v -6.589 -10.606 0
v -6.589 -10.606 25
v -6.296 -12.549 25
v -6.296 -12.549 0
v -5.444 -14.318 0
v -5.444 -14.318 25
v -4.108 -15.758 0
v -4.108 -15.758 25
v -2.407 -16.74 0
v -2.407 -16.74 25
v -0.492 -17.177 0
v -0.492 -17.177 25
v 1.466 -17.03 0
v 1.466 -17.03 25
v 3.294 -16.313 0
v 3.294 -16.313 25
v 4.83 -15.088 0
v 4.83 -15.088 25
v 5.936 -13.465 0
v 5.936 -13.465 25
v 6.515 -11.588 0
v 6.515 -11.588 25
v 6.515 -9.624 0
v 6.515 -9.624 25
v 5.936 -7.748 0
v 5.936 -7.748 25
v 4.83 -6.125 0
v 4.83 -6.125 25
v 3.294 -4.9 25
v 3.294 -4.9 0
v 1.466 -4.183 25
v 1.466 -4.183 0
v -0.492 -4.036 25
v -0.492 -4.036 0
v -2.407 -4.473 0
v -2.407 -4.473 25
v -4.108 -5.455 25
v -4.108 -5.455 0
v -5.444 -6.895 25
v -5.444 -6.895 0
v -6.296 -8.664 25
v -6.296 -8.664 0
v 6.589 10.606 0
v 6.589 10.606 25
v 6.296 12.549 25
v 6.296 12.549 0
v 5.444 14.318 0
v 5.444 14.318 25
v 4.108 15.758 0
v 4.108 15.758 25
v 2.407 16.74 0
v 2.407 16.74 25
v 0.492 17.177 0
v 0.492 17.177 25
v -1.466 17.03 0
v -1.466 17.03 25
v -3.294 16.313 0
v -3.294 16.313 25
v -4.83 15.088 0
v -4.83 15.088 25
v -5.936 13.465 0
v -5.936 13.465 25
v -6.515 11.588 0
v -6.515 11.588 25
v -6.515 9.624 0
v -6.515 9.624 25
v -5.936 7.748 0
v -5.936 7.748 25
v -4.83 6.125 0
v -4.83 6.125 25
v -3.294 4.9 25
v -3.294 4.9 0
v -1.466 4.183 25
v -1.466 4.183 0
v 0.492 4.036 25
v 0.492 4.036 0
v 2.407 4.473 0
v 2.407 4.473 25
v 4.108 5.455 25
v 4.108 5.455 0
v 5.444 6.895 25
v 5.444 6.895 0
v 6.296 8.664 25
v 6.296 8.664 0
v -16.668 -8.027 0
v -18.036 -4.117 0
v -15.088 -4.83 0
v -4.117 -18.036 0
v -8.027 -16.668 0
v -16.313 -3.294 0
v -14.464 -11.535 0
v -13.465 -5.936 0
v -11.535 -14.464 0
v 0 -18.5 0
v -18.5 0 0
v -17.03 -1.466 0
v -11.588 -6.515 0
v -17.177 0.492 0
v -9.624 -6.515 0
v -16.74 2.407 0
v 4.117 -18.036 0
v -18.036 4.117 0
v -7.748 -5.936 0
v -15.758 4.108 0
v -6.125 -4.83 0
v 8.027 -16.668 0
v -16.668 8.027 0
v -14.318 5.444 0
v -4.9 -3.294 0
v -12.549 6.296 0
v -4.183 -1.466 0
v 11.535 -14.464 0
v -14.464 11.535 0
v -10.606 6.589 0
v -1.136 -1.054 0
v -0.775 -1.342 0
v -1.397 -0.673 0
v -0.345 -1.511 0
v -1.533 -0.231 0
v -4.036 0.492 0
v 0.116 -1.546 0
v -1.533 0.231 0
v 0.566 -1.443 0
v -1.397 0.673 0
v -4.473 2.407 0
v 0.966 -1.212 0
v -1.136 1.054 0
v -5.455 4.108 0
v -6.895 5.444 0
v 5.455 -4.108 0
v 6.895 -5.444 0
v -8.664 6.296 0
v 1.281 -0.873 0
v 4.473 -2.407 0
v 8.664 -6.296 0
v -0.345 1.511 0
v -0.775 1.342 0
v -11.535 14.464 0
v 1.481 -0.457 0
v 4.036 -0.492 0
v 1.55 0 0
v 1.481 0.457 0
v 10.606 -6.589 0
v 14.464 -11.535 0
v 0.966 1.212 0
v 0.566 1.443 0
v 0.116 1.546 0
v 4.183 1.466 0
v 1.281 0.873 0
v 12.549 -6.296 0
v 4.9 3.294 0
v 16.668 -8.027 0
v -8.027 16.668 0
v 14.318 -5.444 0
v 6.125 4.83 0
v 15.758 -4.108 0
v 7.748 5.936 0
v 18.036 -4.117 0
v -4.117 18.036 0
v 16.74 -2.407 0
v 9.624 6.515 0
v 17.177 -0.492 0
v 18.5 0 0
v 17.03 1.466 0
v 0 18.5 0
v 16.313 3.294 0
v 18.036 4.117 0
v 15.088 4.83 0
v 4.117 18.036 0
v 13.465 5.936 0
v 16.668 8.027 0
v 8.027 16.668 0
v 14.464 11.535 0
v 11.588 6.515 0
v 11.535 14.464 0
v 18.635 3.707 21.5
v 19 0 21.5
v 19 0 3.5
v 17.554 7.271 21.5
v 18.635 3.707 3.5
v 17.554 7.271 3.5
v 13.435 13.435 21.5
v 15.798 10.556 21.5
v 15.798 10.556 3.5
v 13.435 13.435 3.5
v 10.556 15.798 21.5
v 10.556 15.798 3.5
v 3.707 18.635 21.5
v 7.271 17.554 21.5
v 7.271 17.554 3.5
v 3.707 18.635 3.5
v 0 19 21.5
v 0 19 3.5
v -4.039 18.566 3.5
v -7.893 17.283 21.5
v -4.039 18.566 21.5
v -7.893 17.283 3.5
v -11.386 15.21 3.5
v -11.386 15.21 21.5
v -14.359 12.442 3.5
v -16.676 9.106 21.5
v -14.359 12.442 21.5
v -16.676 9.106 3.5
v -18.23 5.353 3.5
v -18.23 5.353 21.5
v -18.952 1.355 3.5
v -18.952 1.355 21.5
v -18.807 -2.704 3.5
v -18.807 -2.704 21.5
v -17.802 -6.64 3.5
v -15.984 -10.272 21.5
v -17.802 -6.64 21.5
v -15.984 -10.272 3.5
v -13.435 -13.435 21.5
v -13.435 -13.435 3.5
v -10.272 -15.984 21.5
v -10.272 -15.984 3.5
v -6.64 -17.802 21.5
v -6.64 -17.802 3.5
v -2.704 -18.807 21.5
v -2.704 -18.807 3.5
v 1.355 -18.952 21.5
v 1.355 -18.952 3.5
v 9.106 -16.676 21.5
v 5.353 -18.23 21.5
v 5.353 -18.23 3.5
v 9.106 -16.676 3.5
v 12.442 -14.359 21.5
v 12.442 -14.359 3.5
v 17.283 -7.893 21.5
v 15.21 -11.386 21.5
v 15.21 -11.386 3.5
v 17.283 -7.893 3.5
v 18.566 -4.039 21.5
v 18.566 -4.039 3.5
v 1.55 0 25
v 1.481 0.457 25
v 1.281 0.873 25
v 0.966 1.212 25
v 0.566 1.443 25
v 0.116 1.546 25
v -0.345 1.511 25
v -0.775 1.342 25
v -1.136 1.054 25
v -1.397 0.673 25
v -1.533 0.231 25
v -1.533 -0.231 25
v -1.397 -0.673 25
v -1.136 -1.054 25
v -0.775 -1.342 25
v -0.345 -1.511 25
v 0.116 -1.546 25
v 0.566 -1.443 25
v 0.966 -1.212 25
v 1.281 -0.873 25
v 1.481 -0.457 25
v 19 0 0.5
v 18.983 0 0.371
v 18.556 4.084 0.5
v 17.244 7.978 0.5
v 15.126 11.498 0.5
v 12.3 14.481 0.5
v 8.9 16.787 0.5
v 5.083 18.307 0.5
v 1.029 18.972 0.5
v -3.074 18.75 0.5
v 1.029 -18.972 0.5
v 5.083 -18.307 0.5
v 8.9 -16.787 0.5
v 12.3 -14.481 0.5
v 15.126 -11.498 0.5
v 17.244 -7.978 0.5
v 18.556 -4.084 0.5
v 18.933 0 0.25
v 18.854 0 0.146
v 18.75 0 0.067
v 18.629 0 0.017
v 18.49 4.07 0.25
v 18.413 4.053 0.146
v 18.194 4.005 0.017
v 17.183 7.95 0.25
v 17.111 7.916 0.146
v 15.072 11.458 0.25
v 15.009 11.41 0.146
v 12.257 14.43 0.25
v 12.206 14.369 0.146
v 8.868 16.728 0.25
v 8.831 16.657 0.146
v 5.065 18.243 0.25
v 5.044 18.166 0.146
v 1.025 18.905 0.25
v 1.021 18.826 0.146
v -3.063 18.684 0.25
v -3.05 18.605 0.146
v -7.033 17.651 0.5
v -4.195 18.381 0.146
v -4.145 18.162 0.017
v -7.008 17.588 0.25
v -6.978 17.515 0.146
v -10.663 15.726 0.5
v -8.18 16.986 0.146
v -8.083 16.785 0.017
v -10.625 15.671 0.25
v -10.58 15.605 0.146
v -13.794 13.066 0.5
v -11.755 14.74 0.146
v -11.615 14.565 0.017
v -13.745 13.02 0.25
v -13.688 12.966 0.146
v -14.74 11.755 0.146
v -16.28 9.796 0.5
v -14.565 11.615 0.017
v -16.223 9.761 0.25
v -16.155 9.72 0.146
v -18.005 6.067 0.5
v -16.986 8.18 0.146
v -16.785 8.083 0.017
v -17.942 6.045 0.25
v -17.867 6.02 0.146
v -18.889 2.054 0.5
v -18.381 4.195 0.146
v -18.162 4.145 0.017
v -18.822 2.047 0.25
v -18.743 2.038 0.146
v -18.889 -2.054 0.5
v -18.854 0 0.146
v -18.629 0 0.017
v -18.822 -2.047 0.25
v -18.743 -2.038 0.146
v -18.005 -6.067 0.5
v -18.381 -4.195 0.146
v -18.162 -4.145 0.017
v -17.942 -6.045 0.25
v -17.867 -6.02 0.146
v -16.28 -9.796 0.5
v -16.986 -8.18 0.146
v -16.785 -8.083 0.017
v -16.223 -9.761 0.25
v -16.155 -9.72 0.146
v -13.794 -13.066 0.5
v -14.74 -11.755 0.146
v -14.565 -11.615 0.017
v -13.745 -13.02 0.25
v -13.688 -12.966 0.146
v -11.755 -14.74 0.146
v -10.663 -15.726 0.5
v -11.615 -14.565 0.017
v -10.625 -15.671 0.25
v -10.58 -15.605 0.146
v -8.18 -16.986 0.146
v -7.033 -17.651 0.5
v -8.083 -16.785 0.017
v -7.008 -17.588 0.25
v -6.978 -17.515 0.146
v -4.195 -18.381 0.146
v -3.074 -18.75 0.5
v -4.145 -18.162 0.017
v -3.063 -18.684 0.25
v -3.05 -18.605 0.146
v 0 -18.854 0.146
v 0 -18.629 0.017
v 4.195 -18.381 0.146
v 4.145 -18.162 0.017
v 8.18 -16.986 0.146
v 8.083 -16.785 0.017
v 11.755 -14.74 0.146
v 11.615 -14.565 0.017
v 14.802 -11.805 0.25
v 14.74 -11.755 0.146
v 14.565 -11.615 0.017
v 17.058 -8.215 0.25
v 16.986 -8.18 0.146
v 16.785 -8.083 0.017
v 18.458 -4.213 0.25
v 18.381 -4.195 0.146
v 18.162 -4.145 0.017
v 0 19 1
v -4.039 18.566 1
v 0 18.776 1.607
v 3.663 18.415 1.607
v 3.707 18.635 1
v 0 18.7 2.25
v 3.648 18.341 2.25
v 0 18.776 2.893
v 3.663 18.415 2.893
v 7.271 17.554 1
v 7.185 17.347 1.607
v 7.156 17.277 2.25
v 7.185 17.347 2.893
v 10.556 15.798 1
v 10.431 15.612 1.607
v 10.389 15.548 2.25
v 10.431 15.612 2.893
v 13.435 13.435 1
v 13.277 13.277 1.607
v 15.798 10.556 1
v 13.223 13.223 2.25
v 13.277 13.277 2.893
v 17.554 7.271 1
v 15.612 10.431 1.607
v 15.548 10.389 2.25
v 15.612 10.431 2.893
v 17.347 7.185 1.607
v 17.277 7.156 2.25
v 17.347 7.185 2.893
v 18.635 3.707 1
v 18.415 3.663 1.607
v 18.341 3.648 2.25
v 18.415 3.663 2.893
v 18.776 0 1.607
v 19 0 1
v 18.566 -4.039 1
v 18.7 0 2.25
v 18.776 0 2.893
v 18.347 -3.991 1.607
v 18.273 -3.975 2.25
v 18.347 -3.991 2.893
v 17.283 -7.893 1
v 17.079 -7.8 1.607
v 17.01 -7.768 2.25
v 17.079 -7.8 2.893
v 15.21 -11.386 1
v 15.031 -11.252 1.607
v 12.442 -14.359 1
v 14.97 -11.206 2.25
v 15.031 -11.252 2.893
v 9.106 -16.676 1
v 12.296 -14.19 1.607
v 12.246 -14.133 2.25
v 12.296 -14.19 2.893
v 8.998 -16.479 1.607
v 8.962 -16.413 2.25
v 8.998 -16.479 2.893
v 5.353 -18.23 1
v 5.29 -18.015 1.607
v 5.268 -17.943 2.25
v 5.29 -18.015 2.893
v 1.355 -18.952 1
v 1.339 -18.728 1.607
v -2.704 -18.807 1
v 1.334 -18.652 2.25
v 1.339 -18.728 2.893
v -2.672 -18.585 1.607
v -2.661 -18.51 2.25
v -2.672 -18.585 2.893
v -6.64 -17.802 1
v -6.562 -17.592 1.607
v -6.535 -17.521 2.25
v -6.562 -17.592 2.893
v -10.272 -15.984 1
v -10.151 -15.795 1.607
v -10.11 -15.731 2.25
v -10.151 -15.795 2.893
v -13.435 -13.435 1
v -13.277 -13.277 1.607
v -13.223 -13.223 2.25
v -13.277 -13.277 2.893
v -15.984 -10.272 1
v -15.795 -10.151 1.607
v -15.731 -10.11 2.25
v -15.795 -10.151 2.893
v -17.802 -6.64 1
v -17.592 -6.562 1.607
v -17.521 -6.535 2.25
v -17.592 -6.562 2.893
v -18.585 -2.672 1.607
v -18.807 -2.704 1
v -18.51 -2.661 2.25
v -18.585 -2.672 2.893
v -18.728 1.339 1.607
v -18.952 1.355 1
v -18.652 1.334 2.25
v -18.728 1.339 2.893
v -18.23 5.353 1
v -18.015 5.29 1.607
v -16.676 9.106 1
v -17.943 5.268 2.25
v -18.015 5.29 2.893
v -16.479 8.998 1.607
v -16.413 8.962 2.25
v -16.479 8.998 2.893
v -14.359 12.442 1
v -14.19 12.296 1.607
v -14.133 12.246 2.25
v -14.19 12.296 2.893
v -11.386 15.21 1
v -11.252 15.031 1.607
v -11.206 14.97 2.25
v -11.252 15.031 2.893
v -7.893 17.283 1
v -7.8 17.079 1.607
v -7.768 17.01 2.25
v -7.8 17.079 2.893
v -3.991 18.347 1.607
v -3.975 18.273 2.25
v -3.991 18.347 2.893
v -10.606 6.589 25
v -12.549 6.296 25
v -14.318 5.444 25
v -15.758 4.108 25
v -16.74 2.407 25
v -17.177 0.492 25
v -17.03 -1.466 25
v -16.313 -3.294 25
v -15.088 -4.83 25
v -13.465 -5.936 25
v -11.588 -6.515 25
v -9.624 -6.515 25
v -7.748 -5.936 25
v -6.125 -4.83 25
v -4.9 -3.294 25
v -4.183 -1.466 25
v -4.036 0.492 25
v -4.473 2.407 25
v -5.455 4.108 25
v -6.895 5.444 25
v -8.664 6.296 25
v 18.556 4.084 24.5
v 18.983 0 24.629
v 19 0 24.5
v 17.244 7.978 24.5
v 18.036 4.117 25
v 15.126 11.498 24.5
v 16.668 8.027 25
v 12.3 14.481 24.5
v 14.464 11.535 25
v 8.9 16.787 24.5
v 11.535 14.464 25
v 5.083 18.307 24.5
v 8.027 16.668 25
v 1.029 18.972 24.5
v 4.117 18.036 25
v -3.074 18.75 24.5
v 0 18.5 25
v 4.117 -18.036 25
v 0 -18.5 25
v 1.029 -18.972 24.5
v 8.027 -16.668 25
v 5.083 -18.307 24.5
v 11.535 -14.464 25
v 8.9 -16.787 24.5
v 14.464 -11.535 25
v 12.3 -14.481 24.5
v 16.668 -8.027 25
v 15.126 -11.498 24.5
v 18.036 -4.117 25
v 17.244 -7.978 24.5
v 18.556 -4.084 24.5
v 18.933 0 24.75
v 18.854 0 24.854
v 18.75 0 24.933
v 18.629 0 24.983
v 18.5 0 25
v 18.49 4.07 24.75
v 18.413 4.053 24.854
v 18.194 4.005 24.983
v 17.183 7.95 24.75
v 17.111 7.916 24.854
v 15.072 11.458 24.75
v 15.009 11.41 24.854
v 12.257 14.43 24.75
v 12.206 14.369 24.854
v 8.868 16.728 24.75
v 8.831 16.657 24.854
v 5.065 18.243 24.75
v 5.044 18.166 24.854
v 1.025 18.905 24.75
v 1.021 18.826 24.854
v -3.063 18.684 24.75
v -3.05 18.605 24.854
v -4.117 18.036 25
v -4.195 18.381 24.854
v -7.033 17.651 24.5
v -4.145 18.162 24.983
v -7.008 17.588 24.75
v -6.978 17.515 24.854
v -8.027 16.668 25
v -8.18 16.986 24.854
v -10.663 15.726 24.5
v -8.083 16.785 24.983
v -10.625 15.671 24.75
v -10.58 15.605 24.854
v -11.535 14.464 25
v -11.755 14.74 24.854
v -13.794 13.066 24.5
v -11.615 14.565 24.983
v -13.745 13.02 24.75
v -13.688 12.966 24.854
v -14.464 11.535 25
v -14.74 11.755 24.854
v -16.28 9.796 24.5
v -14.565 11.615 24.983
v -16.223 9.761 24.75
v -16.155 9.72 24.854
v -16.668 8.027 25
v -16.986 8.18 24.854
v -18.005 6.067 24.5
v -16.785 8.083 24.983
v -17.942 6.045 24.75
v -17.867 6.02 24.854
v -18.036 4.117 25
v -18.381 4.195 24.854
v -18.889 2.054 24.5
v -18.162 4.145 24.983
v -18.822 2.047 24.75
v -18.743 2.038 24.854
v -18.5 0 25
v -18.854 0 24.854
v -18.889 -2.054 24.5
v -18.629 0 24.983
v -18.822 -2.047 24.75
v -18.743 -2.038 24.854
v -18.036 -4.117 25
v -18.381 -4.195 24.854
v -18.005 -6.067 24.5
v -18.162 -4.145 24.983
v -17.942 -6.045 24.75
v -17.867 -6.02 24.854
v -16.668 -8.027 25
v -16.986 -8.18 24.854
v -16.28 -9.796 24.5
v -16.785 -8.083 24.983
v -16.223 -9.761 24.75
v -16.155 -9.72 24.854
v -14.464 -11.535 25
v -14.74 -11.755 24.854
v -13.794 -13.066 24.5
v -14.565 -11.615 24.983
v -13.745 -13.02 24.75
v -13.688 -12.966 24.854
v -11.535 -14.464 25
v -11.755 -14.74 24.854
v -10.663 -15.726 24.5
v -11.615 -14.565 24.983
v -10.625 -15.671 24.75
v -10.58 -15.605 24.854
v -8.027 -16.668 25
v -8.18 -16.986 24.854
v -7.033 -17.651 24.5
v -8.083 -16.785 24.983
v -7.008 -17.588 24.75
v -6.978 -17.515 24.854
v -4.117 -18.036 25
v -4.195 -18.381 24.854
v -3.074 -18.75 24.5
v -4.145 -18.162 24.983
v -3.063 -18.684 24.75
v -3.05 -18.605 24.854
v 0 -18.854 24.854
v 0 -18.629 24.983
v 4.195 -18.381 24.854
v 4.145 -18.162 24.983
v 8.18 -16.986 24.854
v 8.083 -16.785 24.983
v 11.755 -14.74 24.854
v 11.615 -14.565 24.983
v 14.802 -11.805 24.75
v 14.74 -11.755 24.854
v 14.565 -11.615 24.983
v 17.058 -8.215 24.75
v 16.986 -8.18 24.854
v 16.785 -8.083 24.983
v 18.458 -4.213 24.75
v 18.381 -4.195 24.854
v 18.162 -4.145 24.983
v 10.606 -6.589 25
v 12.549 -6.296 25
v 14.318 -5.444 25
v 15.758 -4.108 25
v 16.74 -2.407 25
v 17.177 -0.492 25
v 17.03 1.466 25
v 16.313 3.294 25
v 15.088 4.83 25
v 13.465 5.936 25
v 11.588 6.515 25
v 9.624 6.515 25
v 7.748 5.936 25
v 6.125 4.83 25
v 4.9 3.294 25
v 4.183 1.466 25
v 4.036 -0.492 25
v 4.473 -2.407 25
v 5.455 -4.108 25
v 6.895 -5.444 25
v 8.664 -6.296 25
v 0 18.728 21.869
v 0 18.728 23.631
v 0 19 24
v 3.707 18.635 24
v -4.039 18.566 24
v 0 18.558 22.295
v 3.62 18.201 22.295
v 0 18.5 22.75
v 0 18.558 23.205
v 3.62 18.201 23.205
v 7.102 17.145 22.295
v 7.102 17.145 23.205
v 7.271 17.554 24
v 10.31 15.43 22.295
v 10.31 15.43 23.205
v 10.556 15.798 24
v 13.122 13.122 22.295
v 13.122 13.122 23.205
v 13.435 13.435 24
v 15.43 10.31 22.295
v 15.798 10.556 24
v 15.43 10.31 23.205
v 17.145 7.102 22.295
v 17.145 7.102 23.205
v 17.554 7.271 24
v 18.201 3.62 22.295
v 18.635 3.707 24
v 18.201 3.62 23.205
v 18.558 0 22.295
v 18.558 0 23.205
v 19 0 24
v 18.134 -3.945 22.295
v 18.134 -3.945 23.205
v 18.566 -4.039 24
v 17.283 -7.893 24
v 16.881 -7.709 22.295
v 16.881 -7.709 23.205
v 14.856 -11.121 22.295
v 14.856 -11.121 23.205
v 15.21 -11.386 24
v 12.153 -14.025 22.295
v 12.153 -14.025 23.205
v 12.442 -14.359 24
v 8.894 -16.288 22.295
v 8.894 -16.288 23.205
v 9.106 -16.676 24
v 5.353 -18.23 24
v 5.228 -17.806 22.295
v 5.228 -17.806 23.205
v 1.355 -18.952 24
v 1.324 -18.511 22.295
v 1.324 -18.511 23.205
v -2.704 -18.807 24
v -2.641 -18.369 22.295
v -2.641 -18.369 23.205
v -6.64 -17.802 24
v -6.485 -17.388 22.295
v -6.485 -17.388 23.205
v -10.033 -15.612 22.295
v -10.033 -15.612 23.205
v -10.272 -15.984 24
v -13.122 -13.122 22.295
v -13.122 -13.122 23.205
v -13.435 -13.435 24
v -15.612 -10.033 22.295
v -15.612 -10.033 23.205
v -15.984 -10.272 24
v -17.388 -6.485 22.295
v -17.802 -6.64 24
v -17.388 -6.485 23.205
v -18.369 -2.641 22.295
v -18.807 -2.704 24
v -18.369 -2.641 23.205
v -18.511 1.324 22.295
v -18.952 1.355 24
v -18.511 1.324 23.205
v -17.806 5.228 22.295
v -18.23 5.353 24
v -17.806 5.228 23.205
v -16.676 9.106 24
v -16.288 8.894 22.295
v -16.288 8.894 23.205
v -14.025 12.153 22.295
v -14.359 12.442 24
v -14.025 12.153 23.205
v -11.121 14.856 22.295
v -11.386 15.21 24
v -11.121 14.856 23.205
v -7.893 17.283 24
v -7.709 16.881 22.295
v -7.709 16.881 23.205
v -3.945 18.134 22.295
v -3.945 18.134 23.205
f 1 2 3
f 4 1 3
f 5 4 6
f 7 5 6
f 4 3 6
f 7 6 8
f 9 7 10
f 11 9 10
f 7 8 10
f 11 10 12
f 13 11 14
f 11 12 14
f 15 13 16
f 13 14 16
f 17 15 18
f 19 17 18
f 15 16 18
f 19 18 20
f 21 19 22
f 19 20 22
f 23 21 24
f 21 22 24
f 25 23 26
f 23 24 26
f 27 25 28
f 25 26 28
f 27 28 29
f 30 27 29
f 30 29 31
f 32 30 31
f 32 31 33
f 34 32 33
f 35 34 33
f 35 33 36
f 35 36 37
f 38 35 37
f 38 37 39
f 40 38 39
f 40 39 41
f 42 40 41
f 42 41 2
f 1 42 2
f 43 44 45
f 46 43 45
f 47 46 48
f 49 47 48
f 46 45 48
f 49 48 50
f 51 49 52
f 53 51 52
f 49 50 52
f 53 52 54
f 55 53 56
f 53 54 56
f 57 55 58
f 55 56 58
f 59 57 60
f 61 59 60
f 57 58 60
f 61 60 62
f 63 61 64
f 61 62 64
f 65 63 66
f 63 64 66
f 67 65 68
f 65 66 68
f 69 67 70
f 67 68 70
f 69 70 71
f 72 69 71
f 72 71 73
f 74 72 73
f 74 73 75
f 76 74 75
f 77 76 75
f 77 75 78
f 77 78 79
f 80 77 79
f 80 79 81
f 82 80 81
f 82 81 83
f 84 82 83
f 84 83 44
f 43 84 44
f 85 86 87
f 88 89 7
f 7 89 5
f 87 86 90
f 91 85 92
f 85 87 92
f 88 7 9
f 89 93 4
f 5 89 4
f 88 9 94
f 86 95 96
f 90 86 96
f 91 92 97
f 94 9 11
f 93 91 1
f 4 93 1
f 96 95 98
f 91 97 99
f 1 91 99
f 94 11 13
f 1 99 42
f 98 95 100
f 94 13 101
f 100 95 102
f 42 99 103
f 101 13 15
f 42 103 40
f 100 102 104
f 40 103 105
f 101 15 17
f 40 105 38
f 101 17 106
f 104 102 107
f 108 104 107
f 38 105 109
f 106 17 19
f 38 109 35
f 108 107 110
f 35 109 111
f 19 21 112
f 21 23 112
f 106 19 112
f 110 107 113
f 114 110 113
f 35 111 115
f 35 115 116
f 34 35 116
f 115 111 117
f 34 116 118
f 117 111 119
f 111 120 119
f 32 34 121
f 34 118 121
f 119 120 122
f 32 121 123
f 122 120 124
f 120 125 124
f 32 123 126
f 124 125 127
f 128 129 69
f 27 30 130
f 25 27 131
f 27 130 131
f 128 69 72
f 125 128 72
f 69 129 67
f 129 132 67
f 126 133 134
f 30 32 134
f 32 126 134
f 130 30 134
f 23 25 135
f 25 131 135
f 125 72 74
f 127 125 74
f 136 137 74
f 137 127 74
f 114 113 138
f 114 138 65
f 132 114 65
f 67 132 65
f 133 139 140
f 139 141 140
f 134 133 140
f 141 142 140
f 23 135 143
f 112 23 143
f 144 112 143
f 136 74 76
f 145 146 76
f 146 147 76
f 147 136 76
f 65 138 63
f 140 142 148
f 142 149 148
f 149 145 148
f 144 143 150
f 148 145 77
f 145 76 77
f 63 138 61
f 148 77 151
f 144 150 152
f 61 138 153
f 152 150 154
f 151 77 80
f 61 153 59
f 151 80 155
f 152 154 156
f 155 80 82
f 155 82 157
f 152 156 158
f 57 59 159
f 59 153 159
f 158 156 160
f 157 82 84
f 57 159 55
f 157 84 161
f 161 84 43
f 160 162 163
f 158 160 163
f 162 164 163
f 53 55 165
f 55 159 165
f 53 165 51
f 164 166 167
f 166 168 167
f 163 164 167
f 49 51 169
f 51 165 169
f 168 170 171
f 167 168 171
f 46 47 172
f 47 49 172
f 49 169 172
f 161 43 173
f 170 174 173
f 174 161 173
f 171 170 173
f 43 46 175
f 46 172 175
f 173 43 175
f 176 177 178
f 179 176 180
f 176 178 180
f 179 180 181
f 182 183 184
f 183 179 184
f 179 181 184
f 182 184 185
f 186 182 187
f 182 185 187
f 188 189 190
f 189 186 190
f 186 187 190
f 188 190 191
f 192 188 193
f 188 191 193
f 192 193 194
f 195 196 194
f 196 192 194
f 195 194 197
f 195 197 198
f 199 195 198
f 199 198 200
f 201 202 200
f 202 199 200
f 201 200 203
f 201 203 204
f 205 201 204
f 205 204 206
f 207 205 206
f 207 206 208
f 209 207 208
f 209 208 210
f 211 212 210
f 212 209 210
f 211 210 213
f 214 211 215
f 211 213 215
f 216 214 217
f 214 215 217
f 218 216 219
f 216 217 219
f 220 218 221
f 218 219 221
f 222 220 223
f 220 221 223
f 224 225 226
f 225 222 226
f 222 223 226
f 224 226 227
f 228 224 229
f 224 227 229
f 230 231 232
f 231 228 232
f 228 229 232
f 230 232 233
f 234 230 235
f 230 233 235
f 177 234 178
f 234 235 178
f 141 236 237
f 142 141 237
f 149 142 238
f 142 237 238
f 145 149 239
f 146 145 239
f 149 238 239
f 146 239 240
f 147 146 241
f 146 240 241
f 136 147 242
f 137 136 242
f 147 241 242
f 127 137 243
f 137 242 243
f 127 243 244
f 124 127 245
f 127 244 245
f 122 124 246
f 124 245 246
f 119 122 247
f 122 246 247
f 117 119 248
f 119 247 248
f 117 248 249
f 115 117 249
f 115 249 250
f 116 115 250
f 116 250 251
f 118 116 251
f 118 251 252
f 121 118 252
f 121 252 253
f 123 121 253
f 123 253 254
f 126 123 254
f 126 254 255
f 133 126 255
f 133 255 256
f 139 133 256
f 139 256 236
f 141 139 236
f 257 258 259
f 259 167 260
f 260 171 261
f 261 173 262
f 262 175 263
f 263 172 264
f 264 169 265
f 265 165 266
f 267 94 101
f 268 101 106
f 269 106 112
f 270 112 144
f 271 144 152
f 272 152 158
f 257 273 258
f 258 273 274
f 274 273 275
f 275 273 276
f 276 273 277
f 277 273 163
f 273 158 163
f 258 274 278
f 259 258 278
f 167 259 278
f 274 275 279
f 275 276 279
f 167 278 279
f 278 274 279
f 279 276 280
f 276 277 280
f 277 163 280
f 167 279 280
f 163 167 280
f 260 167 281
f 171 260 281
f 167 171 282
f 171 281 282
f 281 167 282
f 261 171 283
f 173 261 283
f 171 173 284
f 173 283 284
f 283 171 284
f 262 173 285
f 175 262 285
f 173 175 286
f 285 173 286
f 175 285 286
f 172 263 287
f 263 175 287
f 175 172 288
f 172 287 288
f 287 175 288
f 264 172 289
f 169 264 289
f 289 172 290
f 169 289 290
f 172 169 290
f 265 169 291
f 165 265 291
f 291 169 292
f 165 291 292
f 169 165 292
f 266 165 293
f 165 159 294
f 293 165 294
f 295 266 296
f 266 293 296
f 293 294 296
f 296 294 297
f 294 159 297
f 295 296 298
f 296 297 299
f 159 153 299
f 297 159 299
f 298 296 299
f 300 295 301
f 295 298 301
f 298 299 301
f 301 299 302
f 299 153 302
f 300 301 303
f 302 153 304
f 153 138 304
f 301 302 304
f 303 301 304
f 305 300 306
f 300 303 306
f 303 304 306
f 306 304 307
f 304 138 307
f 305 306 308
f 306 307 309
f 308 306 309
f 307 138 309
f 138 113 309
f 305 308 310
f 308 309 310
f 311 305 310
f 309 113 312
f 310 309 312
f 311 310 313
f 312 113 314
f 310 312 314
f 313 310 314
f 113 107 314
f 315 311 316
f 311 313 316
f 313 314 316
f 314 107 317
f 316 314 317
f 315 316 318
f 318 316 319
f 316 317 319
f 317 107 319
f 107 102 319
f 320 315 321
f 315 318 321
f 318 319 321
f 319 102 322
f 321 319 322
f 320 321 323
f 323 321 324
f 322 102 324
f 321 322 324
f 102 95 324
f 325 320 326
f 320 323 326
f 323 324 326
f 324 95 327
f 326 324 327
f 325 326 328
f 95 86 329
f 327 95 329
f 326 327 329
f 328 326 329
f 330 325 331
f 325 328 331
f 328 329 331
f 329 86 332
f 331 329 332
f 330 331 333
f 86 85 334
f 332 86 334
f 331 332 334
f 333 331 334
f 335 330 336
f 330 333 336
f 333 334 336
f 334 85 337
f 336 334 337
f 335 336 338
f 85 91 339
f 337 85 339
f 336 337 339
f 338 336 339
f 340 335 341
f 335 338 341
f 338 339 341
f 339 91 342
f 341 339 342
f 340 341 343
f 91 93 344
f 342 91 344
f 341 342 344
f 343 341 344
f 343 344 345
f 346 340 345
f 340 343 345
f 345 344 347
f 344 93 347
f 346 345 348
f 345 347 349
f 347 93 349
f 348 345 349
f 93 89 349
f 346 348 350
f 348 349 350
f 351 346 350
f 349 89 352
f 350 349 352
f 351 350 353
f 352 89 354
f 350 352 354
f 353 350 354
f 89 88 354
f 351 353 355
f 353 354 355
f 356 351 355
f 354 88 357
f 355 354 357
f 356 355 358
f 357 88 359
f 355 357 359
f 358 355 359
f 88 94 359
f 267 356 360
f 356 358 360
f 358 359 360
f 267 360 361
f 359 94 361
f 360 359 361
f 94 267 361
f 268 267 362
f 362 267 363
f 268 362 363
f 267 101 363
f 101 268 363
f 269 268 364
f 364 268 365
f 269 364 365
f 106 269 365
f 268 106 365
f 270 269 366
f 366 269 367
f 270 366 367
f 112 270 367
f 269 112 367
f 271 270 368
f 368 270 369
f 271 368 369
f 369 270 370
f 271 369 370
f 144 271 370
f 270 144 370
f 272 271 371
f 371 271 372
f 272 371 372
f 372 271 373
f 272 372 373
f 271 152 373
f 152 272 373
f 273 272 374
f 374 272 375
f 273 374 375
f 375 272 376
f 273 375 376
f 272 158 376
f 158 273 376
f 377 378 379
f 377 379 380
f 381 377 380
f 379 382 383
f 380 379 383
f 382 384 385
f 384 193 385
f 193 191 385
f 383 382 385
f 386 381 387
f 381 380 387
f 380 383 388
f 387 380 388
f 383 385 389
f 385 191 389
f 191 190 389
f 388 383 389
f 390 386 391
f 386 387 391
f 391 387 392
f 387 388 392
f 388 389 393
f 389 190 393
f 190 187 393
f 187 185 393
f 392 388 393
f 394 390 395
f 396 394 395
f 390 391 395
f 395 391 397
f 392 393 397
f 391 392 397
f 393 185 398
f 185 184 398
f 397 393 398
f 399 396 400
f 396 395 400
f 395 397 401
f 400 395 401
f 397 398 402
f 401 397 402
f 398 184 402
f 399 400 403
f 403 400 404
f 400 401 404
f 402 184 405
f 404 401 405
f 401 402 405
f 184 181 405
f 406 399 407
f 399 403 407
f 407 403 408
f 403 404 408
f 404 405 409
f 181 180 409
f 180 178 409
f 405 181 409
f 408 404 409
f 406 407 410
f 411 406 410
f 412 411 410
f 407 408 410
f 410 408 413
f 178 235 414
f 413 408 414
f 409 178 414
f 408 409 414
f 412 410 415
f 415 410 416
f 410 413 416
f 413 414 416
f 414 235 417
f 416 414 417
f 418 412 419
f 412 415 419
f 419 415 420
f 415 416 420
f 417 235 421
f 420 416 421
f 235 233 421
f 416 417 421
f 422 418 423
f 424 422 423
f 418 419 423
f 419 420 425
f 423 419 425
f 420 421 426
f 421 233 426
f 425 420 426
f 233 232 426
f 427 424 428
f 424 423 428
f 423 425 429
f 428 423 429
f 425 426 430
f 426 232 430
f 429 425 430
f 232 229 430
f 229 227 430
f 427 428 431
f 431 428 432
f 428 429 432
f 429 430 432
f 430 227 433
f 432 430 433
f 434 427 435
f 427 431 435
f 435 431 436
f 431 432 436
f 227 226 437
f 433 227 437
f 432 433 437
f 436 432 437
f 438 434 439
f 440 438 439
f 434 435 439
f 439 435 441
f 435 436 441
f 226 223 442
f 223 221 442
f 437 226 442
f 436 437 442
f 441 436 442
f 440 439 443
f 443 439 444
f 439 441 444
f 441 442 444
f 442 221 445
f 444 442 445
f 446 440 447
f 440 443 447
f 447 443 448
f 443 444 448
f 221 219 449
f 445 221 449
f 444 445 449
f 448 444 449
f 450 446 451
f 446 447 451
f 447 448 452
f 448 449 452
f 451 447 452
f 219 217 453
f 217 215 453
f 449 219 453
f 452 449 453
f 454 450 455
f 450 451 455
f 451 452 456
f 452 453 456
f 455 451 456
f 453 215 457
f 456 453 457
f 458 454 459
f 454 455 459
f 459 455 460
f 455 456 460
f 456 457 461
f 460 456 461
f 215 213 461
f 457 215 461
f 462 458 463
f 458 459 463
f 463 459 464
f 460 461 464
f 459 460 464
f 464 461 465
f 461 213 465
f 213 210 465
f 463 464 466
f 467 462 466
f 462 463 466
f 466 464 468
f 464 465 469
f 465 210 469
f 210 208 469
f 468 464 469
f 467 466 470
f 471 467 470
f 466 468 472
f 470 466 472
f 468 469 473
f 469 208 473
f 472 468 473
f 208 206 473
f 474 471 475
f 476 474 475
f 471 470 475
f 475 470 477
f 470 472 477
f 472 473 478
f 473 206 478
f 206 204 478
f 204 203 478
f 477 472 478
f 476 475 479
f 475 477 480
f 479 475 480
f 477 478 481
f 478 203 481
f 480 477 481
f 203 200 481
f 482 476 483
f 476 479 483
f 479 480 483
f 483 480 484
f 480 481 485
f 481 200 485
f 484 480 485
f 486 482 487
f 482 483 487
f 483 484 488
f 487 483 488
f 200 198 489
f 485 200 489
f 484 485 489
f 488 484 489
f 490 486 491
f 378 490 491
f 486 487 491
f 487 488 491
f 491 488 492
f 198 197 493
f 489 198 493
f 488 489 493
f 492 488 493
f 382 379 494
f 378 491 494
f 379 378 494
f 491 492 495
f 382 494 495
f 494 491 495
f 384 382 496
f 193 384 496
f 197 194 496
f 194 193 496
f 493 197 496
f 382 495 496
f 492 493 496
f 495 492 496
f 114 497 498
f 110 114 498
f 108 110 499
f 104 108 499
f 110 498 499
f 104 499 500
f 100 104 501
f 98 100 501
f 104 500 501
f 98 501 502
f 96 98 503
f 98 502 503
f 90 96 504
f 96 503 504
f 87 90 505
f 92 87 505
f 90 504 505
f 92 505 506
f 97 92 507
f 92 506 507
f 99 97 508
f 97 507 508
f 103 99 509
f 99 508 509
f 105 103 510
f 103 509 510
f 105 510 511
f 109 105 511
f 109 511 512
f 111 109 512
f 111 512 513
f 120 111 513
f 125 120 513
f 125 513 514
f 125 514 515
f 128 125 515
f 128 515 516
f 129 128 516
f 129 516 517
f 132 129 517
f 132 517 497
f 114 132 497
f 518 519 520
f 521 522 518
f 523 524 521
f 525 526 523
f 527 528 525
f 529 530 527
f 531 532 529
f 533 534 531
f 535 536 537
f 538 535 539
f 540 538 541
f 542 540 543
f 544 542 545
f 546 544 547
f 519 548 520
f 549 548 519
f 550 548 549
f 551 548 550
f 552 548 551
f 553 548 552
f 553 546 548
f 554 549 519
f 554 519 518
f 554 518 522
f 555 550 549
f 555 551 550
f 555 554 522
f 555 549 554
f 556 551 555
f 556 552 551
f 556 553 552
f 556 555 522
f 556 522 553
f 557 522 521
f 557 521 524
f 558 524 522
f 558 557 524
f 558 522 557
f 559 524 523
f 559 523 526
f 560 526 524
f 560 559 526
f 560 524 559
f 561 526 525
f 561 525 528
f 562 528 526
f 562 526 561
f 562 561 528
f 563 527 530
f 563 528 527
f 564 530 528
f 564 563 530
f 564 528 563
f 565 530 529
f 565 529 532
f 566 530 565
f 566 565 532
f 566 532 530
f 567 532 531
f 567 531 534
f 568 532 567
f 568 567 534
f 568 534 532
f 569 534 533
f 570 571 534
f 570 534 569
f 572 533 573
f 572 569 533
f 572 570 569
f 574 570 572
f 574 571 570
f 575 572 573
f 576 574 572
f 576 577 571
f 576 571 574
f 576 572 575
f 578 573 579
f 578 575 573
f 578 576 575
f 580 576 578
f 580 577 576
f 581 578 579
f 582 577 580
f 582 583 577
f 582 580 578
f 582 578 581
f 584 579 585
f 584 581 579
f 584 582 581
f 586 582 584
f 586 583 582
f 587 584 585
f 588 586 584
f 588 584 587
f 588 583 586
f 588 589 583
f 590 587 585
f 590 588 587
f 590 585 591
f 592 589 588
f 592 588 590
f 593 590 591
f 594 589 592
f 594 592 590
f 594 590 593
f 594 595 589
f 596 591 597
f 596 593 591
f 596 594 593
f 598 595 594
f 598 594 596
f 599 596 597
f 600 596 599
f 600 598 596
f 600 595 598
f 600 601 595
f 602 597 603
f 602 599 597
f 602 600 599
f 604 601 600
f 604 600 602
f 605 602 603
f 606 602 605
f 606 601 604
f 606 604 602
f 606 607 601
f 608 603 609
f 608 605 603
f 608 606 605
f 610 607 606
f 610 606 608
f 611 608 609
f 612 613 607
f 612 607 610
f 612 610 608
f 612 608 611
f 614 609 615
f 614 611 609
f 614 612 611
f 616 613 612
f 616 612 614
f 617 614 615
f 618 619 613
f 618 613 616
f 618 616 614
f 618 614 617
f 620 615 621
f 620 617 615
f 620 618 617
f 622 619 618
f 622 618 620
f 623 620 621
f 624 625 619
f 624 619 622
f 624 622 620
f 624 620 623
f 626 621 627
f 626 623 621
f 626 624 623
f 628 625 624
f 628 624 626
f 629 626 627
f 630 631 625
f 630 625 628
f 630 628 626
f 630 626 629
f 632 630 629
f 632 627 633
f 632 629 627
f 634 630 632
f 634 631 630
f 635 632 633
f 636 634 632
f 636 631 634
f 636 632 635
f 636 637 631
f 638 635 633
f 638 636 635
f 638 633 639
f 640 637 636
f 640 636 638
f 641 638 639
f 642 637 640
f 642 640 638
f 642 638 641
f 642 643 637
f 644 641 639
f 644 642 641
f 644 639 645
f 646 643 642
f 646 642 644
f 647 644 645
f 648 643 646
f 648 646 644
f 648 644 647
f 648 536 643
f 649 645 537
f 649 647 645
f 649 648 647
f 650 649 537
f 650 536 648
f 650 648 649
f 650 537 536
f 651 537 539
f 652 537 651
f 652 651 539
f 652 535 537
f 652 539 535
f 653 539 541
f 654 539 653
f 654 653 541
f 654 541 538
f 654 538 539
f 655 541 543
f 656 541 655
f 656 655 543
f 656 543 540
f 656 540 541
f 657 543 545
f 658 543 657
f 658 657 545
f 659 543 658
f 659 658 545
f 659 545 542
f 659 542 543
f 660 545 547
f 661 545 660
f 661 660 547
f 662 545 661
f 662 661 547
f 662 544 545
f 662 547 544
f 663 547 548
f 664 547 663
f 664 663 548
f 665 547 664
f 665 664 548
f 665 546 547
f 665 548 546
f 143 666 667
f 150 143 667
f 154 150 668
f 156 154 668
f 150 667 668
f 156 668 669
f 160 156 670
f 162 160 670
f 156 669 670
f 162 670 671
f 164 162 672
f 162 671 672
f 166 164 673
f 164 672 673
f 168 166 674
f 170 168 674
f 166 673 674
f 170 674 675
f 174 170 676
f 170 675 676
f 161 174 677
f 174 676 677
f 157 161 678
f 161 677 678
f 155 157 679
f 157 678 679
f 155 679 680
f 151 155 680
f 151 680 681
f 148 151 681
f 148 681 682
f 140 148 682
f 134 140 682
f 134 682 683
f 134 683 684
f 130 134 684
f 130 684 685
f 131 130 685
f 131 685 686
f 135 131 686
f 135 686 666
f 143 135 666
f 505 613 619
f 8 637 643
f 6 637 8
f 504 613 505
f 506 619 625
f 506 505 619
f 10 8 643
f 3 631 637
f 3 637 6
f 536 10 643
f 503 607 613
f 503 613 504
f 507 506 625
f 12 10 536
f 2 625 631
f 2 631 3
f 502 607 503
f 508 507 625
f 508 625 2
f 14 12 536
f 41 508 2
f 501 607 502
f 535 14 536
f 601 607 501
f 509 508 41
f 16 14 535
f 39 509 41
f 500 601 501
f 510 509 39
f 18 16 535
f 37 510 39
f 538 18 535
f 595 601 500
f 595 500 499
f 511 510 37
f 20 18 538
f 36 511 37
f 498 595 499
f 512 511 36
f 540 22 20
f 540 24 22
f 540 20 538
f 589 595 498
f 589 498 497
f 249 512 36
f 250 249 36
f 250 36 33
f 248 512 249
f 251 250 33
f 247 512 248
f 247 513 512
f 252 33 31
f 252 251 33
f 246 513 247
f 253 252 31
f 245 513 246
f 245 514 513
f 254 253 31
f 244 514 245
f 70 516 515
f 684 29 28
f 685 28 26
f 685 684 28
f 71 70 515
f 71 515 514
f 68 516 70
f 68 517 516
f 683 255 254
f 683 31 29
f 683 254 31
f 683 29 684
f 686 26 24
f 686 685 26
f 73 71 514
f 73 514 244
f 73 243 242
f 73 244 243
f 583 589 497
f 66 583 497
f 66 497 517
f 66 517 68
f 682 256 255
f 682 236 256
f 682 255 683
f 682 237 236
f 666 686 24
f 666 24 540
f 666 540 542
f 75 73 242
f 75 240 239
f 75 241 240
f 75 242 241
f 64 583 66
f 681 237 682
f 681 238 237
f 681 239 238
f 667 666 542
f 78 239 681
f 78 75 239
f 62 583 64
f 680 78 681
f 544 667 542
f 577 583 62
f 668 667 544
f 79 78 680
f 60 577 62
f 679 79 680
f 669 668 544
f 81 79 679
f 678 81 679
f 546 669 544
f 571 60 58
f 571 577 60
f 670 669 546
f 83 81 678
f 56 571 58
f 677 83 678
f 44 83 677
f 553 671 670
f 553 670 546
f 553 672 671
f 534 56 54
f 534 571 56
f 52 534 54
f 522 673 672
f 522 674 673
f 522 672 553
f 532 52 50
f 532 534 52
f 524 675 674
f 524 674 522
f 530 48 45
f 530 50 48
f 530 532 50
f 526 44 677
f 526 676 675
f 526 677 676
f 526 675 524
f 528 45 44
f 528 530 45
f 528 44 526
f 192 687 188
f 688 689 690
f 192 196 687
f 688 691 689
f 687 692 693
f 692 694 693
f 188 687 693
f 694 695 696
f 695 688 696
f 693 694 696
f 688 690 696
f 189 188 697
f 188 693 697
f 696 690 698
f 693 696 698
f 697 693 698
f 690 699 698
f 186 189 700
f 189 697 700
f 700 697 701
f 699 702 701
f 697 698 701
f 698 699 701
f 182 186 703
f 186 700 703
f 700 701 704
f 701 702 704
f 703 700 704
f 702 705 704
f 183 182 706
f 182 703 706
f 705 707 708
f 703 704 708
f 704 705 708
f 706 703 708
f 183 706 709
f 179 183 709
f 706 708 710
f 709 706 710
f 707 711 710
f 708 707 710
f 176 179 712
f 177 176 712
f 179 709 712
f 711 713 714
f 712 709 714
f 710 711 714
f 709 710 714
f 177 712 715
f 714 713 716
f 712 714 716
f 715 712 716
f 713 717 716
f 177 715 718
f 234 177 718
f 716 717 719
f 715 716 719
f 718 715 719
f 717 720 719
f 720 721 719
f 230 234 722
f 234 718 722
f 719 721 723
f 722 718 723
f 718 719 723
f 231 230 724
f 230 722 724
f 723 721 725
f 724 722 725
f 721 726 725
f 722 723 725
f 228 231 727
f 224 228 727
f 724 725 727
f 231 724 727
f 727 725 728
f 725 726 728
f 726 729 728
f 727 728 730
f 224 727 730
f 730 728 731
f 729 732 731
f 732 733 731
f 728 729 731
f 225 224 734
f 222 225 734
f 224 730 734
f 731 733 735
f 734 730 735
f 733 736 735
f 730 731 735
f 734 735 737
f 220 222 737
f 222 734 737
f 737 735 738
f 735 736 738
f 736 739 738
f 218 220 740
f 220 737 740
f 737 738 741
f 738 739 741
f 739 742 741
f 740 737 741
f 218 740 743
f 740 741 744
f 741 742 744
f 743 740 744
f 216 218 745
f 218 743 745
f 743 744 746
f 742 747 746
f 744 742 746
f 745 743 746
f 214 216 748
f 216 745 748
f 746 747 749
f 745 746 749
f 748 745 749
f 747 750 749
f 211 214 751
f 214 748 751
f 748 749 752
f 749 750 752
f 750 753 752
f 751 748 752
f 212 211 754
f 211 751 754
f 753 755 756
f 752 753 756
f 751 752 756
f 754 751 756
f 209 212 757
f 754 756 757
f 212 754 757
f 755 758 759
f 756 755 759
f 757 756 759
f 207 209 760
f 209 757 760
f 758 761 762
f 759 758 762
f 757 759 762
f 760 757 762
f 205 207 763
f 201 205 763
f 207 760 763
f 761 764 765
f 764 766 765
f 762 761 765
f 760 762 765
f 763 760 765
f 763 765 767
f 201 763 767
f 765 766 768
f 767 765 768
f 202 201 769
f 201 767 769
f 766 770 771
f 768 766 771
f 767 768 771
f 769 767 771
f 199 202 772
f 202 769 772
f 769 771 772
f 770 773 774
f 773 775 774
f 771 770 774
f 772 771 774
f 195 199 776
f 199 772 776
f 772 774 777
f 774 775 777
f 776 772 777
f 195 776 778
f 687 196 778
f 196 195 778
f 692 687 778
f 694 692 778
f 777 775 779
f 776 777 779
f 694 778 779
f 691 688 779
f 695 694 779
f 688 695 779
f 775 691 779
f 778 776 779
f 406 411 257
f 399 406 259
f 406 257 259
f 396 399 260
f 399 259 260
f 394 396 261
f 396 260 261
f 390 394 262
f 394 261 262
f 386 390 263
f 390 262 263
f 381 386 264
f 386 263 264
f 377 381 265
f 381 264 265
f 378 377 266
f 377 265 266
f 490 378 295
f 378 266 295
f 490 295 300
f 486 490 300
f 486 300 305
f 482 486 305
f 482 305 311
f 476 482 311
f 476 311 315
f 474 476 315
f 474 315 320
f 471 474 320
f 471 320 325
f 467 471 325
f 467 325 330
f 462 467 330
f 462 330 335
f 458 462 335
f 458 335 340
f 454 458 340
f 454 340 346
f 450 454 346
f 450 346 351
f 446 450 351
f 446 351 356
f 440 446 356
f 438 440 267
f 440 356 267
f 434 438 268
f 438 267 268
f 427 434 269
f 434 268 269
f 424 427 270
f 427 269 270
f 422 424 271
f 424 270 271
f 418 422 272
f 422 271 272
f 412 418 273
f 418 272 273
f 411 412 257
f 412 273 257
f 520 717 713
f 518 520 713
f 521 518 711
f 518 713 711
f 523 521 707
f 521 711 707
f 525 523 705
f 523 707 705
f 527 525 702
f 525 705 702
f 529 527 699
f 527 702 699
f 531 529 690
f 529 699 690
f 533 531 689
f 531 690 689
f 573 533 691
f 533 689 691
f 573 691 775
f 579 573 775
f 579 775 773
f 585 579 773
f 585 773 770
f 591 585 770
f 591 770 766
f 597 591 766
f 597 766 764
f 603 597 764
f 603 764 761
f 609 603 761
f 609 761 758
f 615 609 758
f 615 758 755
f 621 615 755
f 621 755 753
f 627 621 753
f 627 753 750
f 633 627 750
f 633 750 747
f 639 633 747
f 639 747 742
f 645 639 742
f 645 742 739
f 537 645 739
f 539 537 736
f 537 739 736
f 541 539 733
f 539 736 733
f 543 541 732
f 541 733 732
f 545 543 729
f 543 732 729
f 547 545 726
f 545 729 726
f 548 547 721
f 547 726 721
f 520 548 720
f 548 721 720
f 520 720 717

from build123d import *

# Parameters (mm, degrees)
SKETCH1_R           = 19
BOSS_EXTRUDE1_DEPTH = 25
FILLET1_R           = 0.5
SKETCH3_R           = 1.55
CUT_EXTRUDE1_DEPTH  = 26.0000001
SKETCH4_R           = 6.58897104
CUT_EXTRUDE2_DEPTH  = 26.0000001
CIRPATTERN1_COUNT   = 4


with BuildPart() as part:
    # Sketch1 → Boss-Extrude1 (new body)
    with BuildSketch(Plane.XY):
        Circle(SKETCH1_R)
    extrude(amount=BOSS_EXTRUDE1_DEPTH)

    # Sketch2 → Cut-Revolve1 (revolve, cut)
    with BuildSketch(Plane(origin=(0, 0, 0), x_dir=(0, 0, -1), z_dir=(1, 0, 0))):
        with BuildLine():
            Line((-24, 19), (-21.5, 19))
            ThreePointArc((-21.5, 19), (-22.75, 18.5), (-24, 19))
        make_face()
        with BuildLine():
            Line((-3.5, 19), (-1, 19))
            ThreePointArc((-1, 19), (-2.25, 18.7), (-3.5, 19))
        make_face()
    revolve(axis=Axis((0, 0, 8.4), (0, 0, -1)), mode=Mode.SUBTRACT)

    # Fillet1
    fillet1_edges = [part.edges().sort_by_distance(p)[0] for p in [
        (-19, 0, 0),
        (-19, 0, 25),
    ]]
    fillet(fillet1_edges, radius=FILLET1_R)

    # Sketch3 → Cut-Extrude1 (cut, through all)
    with BuildSketch(Plane.XY.offset(25)):
        Circle(SKETCH3_R)
    extrude(amount=-CUT_EXTRUDE1_DEPTH, mode=Mode.SUBTRACT)

    # Sketch4 → Cut-Extrude2 (cut, through all)
    with BuildSketch(Plane.XY.offset(25)):
        with Locations((0, 10.60646011)):
            Circle(SKETCH4_R)
    cut_extrude2 = extrude(amount=-CUT_EXTRUDE2_DEPTH, mode=Mode.SUBTRACT)

    # CirPattern1: Cut-Extrude2 ×4 about axis
    cirpattern1_axis = Axis((0, 0, 0), (0, 0, 1))
    for i in range(1, CIRPATTERN1_COUNT):
        add(cut_extrude2.rotate(cirpattern1_axis, i * 360 / CIRPATTERN1_COUNT), mode=Mode.SUBTRACT)


solid = part.part
